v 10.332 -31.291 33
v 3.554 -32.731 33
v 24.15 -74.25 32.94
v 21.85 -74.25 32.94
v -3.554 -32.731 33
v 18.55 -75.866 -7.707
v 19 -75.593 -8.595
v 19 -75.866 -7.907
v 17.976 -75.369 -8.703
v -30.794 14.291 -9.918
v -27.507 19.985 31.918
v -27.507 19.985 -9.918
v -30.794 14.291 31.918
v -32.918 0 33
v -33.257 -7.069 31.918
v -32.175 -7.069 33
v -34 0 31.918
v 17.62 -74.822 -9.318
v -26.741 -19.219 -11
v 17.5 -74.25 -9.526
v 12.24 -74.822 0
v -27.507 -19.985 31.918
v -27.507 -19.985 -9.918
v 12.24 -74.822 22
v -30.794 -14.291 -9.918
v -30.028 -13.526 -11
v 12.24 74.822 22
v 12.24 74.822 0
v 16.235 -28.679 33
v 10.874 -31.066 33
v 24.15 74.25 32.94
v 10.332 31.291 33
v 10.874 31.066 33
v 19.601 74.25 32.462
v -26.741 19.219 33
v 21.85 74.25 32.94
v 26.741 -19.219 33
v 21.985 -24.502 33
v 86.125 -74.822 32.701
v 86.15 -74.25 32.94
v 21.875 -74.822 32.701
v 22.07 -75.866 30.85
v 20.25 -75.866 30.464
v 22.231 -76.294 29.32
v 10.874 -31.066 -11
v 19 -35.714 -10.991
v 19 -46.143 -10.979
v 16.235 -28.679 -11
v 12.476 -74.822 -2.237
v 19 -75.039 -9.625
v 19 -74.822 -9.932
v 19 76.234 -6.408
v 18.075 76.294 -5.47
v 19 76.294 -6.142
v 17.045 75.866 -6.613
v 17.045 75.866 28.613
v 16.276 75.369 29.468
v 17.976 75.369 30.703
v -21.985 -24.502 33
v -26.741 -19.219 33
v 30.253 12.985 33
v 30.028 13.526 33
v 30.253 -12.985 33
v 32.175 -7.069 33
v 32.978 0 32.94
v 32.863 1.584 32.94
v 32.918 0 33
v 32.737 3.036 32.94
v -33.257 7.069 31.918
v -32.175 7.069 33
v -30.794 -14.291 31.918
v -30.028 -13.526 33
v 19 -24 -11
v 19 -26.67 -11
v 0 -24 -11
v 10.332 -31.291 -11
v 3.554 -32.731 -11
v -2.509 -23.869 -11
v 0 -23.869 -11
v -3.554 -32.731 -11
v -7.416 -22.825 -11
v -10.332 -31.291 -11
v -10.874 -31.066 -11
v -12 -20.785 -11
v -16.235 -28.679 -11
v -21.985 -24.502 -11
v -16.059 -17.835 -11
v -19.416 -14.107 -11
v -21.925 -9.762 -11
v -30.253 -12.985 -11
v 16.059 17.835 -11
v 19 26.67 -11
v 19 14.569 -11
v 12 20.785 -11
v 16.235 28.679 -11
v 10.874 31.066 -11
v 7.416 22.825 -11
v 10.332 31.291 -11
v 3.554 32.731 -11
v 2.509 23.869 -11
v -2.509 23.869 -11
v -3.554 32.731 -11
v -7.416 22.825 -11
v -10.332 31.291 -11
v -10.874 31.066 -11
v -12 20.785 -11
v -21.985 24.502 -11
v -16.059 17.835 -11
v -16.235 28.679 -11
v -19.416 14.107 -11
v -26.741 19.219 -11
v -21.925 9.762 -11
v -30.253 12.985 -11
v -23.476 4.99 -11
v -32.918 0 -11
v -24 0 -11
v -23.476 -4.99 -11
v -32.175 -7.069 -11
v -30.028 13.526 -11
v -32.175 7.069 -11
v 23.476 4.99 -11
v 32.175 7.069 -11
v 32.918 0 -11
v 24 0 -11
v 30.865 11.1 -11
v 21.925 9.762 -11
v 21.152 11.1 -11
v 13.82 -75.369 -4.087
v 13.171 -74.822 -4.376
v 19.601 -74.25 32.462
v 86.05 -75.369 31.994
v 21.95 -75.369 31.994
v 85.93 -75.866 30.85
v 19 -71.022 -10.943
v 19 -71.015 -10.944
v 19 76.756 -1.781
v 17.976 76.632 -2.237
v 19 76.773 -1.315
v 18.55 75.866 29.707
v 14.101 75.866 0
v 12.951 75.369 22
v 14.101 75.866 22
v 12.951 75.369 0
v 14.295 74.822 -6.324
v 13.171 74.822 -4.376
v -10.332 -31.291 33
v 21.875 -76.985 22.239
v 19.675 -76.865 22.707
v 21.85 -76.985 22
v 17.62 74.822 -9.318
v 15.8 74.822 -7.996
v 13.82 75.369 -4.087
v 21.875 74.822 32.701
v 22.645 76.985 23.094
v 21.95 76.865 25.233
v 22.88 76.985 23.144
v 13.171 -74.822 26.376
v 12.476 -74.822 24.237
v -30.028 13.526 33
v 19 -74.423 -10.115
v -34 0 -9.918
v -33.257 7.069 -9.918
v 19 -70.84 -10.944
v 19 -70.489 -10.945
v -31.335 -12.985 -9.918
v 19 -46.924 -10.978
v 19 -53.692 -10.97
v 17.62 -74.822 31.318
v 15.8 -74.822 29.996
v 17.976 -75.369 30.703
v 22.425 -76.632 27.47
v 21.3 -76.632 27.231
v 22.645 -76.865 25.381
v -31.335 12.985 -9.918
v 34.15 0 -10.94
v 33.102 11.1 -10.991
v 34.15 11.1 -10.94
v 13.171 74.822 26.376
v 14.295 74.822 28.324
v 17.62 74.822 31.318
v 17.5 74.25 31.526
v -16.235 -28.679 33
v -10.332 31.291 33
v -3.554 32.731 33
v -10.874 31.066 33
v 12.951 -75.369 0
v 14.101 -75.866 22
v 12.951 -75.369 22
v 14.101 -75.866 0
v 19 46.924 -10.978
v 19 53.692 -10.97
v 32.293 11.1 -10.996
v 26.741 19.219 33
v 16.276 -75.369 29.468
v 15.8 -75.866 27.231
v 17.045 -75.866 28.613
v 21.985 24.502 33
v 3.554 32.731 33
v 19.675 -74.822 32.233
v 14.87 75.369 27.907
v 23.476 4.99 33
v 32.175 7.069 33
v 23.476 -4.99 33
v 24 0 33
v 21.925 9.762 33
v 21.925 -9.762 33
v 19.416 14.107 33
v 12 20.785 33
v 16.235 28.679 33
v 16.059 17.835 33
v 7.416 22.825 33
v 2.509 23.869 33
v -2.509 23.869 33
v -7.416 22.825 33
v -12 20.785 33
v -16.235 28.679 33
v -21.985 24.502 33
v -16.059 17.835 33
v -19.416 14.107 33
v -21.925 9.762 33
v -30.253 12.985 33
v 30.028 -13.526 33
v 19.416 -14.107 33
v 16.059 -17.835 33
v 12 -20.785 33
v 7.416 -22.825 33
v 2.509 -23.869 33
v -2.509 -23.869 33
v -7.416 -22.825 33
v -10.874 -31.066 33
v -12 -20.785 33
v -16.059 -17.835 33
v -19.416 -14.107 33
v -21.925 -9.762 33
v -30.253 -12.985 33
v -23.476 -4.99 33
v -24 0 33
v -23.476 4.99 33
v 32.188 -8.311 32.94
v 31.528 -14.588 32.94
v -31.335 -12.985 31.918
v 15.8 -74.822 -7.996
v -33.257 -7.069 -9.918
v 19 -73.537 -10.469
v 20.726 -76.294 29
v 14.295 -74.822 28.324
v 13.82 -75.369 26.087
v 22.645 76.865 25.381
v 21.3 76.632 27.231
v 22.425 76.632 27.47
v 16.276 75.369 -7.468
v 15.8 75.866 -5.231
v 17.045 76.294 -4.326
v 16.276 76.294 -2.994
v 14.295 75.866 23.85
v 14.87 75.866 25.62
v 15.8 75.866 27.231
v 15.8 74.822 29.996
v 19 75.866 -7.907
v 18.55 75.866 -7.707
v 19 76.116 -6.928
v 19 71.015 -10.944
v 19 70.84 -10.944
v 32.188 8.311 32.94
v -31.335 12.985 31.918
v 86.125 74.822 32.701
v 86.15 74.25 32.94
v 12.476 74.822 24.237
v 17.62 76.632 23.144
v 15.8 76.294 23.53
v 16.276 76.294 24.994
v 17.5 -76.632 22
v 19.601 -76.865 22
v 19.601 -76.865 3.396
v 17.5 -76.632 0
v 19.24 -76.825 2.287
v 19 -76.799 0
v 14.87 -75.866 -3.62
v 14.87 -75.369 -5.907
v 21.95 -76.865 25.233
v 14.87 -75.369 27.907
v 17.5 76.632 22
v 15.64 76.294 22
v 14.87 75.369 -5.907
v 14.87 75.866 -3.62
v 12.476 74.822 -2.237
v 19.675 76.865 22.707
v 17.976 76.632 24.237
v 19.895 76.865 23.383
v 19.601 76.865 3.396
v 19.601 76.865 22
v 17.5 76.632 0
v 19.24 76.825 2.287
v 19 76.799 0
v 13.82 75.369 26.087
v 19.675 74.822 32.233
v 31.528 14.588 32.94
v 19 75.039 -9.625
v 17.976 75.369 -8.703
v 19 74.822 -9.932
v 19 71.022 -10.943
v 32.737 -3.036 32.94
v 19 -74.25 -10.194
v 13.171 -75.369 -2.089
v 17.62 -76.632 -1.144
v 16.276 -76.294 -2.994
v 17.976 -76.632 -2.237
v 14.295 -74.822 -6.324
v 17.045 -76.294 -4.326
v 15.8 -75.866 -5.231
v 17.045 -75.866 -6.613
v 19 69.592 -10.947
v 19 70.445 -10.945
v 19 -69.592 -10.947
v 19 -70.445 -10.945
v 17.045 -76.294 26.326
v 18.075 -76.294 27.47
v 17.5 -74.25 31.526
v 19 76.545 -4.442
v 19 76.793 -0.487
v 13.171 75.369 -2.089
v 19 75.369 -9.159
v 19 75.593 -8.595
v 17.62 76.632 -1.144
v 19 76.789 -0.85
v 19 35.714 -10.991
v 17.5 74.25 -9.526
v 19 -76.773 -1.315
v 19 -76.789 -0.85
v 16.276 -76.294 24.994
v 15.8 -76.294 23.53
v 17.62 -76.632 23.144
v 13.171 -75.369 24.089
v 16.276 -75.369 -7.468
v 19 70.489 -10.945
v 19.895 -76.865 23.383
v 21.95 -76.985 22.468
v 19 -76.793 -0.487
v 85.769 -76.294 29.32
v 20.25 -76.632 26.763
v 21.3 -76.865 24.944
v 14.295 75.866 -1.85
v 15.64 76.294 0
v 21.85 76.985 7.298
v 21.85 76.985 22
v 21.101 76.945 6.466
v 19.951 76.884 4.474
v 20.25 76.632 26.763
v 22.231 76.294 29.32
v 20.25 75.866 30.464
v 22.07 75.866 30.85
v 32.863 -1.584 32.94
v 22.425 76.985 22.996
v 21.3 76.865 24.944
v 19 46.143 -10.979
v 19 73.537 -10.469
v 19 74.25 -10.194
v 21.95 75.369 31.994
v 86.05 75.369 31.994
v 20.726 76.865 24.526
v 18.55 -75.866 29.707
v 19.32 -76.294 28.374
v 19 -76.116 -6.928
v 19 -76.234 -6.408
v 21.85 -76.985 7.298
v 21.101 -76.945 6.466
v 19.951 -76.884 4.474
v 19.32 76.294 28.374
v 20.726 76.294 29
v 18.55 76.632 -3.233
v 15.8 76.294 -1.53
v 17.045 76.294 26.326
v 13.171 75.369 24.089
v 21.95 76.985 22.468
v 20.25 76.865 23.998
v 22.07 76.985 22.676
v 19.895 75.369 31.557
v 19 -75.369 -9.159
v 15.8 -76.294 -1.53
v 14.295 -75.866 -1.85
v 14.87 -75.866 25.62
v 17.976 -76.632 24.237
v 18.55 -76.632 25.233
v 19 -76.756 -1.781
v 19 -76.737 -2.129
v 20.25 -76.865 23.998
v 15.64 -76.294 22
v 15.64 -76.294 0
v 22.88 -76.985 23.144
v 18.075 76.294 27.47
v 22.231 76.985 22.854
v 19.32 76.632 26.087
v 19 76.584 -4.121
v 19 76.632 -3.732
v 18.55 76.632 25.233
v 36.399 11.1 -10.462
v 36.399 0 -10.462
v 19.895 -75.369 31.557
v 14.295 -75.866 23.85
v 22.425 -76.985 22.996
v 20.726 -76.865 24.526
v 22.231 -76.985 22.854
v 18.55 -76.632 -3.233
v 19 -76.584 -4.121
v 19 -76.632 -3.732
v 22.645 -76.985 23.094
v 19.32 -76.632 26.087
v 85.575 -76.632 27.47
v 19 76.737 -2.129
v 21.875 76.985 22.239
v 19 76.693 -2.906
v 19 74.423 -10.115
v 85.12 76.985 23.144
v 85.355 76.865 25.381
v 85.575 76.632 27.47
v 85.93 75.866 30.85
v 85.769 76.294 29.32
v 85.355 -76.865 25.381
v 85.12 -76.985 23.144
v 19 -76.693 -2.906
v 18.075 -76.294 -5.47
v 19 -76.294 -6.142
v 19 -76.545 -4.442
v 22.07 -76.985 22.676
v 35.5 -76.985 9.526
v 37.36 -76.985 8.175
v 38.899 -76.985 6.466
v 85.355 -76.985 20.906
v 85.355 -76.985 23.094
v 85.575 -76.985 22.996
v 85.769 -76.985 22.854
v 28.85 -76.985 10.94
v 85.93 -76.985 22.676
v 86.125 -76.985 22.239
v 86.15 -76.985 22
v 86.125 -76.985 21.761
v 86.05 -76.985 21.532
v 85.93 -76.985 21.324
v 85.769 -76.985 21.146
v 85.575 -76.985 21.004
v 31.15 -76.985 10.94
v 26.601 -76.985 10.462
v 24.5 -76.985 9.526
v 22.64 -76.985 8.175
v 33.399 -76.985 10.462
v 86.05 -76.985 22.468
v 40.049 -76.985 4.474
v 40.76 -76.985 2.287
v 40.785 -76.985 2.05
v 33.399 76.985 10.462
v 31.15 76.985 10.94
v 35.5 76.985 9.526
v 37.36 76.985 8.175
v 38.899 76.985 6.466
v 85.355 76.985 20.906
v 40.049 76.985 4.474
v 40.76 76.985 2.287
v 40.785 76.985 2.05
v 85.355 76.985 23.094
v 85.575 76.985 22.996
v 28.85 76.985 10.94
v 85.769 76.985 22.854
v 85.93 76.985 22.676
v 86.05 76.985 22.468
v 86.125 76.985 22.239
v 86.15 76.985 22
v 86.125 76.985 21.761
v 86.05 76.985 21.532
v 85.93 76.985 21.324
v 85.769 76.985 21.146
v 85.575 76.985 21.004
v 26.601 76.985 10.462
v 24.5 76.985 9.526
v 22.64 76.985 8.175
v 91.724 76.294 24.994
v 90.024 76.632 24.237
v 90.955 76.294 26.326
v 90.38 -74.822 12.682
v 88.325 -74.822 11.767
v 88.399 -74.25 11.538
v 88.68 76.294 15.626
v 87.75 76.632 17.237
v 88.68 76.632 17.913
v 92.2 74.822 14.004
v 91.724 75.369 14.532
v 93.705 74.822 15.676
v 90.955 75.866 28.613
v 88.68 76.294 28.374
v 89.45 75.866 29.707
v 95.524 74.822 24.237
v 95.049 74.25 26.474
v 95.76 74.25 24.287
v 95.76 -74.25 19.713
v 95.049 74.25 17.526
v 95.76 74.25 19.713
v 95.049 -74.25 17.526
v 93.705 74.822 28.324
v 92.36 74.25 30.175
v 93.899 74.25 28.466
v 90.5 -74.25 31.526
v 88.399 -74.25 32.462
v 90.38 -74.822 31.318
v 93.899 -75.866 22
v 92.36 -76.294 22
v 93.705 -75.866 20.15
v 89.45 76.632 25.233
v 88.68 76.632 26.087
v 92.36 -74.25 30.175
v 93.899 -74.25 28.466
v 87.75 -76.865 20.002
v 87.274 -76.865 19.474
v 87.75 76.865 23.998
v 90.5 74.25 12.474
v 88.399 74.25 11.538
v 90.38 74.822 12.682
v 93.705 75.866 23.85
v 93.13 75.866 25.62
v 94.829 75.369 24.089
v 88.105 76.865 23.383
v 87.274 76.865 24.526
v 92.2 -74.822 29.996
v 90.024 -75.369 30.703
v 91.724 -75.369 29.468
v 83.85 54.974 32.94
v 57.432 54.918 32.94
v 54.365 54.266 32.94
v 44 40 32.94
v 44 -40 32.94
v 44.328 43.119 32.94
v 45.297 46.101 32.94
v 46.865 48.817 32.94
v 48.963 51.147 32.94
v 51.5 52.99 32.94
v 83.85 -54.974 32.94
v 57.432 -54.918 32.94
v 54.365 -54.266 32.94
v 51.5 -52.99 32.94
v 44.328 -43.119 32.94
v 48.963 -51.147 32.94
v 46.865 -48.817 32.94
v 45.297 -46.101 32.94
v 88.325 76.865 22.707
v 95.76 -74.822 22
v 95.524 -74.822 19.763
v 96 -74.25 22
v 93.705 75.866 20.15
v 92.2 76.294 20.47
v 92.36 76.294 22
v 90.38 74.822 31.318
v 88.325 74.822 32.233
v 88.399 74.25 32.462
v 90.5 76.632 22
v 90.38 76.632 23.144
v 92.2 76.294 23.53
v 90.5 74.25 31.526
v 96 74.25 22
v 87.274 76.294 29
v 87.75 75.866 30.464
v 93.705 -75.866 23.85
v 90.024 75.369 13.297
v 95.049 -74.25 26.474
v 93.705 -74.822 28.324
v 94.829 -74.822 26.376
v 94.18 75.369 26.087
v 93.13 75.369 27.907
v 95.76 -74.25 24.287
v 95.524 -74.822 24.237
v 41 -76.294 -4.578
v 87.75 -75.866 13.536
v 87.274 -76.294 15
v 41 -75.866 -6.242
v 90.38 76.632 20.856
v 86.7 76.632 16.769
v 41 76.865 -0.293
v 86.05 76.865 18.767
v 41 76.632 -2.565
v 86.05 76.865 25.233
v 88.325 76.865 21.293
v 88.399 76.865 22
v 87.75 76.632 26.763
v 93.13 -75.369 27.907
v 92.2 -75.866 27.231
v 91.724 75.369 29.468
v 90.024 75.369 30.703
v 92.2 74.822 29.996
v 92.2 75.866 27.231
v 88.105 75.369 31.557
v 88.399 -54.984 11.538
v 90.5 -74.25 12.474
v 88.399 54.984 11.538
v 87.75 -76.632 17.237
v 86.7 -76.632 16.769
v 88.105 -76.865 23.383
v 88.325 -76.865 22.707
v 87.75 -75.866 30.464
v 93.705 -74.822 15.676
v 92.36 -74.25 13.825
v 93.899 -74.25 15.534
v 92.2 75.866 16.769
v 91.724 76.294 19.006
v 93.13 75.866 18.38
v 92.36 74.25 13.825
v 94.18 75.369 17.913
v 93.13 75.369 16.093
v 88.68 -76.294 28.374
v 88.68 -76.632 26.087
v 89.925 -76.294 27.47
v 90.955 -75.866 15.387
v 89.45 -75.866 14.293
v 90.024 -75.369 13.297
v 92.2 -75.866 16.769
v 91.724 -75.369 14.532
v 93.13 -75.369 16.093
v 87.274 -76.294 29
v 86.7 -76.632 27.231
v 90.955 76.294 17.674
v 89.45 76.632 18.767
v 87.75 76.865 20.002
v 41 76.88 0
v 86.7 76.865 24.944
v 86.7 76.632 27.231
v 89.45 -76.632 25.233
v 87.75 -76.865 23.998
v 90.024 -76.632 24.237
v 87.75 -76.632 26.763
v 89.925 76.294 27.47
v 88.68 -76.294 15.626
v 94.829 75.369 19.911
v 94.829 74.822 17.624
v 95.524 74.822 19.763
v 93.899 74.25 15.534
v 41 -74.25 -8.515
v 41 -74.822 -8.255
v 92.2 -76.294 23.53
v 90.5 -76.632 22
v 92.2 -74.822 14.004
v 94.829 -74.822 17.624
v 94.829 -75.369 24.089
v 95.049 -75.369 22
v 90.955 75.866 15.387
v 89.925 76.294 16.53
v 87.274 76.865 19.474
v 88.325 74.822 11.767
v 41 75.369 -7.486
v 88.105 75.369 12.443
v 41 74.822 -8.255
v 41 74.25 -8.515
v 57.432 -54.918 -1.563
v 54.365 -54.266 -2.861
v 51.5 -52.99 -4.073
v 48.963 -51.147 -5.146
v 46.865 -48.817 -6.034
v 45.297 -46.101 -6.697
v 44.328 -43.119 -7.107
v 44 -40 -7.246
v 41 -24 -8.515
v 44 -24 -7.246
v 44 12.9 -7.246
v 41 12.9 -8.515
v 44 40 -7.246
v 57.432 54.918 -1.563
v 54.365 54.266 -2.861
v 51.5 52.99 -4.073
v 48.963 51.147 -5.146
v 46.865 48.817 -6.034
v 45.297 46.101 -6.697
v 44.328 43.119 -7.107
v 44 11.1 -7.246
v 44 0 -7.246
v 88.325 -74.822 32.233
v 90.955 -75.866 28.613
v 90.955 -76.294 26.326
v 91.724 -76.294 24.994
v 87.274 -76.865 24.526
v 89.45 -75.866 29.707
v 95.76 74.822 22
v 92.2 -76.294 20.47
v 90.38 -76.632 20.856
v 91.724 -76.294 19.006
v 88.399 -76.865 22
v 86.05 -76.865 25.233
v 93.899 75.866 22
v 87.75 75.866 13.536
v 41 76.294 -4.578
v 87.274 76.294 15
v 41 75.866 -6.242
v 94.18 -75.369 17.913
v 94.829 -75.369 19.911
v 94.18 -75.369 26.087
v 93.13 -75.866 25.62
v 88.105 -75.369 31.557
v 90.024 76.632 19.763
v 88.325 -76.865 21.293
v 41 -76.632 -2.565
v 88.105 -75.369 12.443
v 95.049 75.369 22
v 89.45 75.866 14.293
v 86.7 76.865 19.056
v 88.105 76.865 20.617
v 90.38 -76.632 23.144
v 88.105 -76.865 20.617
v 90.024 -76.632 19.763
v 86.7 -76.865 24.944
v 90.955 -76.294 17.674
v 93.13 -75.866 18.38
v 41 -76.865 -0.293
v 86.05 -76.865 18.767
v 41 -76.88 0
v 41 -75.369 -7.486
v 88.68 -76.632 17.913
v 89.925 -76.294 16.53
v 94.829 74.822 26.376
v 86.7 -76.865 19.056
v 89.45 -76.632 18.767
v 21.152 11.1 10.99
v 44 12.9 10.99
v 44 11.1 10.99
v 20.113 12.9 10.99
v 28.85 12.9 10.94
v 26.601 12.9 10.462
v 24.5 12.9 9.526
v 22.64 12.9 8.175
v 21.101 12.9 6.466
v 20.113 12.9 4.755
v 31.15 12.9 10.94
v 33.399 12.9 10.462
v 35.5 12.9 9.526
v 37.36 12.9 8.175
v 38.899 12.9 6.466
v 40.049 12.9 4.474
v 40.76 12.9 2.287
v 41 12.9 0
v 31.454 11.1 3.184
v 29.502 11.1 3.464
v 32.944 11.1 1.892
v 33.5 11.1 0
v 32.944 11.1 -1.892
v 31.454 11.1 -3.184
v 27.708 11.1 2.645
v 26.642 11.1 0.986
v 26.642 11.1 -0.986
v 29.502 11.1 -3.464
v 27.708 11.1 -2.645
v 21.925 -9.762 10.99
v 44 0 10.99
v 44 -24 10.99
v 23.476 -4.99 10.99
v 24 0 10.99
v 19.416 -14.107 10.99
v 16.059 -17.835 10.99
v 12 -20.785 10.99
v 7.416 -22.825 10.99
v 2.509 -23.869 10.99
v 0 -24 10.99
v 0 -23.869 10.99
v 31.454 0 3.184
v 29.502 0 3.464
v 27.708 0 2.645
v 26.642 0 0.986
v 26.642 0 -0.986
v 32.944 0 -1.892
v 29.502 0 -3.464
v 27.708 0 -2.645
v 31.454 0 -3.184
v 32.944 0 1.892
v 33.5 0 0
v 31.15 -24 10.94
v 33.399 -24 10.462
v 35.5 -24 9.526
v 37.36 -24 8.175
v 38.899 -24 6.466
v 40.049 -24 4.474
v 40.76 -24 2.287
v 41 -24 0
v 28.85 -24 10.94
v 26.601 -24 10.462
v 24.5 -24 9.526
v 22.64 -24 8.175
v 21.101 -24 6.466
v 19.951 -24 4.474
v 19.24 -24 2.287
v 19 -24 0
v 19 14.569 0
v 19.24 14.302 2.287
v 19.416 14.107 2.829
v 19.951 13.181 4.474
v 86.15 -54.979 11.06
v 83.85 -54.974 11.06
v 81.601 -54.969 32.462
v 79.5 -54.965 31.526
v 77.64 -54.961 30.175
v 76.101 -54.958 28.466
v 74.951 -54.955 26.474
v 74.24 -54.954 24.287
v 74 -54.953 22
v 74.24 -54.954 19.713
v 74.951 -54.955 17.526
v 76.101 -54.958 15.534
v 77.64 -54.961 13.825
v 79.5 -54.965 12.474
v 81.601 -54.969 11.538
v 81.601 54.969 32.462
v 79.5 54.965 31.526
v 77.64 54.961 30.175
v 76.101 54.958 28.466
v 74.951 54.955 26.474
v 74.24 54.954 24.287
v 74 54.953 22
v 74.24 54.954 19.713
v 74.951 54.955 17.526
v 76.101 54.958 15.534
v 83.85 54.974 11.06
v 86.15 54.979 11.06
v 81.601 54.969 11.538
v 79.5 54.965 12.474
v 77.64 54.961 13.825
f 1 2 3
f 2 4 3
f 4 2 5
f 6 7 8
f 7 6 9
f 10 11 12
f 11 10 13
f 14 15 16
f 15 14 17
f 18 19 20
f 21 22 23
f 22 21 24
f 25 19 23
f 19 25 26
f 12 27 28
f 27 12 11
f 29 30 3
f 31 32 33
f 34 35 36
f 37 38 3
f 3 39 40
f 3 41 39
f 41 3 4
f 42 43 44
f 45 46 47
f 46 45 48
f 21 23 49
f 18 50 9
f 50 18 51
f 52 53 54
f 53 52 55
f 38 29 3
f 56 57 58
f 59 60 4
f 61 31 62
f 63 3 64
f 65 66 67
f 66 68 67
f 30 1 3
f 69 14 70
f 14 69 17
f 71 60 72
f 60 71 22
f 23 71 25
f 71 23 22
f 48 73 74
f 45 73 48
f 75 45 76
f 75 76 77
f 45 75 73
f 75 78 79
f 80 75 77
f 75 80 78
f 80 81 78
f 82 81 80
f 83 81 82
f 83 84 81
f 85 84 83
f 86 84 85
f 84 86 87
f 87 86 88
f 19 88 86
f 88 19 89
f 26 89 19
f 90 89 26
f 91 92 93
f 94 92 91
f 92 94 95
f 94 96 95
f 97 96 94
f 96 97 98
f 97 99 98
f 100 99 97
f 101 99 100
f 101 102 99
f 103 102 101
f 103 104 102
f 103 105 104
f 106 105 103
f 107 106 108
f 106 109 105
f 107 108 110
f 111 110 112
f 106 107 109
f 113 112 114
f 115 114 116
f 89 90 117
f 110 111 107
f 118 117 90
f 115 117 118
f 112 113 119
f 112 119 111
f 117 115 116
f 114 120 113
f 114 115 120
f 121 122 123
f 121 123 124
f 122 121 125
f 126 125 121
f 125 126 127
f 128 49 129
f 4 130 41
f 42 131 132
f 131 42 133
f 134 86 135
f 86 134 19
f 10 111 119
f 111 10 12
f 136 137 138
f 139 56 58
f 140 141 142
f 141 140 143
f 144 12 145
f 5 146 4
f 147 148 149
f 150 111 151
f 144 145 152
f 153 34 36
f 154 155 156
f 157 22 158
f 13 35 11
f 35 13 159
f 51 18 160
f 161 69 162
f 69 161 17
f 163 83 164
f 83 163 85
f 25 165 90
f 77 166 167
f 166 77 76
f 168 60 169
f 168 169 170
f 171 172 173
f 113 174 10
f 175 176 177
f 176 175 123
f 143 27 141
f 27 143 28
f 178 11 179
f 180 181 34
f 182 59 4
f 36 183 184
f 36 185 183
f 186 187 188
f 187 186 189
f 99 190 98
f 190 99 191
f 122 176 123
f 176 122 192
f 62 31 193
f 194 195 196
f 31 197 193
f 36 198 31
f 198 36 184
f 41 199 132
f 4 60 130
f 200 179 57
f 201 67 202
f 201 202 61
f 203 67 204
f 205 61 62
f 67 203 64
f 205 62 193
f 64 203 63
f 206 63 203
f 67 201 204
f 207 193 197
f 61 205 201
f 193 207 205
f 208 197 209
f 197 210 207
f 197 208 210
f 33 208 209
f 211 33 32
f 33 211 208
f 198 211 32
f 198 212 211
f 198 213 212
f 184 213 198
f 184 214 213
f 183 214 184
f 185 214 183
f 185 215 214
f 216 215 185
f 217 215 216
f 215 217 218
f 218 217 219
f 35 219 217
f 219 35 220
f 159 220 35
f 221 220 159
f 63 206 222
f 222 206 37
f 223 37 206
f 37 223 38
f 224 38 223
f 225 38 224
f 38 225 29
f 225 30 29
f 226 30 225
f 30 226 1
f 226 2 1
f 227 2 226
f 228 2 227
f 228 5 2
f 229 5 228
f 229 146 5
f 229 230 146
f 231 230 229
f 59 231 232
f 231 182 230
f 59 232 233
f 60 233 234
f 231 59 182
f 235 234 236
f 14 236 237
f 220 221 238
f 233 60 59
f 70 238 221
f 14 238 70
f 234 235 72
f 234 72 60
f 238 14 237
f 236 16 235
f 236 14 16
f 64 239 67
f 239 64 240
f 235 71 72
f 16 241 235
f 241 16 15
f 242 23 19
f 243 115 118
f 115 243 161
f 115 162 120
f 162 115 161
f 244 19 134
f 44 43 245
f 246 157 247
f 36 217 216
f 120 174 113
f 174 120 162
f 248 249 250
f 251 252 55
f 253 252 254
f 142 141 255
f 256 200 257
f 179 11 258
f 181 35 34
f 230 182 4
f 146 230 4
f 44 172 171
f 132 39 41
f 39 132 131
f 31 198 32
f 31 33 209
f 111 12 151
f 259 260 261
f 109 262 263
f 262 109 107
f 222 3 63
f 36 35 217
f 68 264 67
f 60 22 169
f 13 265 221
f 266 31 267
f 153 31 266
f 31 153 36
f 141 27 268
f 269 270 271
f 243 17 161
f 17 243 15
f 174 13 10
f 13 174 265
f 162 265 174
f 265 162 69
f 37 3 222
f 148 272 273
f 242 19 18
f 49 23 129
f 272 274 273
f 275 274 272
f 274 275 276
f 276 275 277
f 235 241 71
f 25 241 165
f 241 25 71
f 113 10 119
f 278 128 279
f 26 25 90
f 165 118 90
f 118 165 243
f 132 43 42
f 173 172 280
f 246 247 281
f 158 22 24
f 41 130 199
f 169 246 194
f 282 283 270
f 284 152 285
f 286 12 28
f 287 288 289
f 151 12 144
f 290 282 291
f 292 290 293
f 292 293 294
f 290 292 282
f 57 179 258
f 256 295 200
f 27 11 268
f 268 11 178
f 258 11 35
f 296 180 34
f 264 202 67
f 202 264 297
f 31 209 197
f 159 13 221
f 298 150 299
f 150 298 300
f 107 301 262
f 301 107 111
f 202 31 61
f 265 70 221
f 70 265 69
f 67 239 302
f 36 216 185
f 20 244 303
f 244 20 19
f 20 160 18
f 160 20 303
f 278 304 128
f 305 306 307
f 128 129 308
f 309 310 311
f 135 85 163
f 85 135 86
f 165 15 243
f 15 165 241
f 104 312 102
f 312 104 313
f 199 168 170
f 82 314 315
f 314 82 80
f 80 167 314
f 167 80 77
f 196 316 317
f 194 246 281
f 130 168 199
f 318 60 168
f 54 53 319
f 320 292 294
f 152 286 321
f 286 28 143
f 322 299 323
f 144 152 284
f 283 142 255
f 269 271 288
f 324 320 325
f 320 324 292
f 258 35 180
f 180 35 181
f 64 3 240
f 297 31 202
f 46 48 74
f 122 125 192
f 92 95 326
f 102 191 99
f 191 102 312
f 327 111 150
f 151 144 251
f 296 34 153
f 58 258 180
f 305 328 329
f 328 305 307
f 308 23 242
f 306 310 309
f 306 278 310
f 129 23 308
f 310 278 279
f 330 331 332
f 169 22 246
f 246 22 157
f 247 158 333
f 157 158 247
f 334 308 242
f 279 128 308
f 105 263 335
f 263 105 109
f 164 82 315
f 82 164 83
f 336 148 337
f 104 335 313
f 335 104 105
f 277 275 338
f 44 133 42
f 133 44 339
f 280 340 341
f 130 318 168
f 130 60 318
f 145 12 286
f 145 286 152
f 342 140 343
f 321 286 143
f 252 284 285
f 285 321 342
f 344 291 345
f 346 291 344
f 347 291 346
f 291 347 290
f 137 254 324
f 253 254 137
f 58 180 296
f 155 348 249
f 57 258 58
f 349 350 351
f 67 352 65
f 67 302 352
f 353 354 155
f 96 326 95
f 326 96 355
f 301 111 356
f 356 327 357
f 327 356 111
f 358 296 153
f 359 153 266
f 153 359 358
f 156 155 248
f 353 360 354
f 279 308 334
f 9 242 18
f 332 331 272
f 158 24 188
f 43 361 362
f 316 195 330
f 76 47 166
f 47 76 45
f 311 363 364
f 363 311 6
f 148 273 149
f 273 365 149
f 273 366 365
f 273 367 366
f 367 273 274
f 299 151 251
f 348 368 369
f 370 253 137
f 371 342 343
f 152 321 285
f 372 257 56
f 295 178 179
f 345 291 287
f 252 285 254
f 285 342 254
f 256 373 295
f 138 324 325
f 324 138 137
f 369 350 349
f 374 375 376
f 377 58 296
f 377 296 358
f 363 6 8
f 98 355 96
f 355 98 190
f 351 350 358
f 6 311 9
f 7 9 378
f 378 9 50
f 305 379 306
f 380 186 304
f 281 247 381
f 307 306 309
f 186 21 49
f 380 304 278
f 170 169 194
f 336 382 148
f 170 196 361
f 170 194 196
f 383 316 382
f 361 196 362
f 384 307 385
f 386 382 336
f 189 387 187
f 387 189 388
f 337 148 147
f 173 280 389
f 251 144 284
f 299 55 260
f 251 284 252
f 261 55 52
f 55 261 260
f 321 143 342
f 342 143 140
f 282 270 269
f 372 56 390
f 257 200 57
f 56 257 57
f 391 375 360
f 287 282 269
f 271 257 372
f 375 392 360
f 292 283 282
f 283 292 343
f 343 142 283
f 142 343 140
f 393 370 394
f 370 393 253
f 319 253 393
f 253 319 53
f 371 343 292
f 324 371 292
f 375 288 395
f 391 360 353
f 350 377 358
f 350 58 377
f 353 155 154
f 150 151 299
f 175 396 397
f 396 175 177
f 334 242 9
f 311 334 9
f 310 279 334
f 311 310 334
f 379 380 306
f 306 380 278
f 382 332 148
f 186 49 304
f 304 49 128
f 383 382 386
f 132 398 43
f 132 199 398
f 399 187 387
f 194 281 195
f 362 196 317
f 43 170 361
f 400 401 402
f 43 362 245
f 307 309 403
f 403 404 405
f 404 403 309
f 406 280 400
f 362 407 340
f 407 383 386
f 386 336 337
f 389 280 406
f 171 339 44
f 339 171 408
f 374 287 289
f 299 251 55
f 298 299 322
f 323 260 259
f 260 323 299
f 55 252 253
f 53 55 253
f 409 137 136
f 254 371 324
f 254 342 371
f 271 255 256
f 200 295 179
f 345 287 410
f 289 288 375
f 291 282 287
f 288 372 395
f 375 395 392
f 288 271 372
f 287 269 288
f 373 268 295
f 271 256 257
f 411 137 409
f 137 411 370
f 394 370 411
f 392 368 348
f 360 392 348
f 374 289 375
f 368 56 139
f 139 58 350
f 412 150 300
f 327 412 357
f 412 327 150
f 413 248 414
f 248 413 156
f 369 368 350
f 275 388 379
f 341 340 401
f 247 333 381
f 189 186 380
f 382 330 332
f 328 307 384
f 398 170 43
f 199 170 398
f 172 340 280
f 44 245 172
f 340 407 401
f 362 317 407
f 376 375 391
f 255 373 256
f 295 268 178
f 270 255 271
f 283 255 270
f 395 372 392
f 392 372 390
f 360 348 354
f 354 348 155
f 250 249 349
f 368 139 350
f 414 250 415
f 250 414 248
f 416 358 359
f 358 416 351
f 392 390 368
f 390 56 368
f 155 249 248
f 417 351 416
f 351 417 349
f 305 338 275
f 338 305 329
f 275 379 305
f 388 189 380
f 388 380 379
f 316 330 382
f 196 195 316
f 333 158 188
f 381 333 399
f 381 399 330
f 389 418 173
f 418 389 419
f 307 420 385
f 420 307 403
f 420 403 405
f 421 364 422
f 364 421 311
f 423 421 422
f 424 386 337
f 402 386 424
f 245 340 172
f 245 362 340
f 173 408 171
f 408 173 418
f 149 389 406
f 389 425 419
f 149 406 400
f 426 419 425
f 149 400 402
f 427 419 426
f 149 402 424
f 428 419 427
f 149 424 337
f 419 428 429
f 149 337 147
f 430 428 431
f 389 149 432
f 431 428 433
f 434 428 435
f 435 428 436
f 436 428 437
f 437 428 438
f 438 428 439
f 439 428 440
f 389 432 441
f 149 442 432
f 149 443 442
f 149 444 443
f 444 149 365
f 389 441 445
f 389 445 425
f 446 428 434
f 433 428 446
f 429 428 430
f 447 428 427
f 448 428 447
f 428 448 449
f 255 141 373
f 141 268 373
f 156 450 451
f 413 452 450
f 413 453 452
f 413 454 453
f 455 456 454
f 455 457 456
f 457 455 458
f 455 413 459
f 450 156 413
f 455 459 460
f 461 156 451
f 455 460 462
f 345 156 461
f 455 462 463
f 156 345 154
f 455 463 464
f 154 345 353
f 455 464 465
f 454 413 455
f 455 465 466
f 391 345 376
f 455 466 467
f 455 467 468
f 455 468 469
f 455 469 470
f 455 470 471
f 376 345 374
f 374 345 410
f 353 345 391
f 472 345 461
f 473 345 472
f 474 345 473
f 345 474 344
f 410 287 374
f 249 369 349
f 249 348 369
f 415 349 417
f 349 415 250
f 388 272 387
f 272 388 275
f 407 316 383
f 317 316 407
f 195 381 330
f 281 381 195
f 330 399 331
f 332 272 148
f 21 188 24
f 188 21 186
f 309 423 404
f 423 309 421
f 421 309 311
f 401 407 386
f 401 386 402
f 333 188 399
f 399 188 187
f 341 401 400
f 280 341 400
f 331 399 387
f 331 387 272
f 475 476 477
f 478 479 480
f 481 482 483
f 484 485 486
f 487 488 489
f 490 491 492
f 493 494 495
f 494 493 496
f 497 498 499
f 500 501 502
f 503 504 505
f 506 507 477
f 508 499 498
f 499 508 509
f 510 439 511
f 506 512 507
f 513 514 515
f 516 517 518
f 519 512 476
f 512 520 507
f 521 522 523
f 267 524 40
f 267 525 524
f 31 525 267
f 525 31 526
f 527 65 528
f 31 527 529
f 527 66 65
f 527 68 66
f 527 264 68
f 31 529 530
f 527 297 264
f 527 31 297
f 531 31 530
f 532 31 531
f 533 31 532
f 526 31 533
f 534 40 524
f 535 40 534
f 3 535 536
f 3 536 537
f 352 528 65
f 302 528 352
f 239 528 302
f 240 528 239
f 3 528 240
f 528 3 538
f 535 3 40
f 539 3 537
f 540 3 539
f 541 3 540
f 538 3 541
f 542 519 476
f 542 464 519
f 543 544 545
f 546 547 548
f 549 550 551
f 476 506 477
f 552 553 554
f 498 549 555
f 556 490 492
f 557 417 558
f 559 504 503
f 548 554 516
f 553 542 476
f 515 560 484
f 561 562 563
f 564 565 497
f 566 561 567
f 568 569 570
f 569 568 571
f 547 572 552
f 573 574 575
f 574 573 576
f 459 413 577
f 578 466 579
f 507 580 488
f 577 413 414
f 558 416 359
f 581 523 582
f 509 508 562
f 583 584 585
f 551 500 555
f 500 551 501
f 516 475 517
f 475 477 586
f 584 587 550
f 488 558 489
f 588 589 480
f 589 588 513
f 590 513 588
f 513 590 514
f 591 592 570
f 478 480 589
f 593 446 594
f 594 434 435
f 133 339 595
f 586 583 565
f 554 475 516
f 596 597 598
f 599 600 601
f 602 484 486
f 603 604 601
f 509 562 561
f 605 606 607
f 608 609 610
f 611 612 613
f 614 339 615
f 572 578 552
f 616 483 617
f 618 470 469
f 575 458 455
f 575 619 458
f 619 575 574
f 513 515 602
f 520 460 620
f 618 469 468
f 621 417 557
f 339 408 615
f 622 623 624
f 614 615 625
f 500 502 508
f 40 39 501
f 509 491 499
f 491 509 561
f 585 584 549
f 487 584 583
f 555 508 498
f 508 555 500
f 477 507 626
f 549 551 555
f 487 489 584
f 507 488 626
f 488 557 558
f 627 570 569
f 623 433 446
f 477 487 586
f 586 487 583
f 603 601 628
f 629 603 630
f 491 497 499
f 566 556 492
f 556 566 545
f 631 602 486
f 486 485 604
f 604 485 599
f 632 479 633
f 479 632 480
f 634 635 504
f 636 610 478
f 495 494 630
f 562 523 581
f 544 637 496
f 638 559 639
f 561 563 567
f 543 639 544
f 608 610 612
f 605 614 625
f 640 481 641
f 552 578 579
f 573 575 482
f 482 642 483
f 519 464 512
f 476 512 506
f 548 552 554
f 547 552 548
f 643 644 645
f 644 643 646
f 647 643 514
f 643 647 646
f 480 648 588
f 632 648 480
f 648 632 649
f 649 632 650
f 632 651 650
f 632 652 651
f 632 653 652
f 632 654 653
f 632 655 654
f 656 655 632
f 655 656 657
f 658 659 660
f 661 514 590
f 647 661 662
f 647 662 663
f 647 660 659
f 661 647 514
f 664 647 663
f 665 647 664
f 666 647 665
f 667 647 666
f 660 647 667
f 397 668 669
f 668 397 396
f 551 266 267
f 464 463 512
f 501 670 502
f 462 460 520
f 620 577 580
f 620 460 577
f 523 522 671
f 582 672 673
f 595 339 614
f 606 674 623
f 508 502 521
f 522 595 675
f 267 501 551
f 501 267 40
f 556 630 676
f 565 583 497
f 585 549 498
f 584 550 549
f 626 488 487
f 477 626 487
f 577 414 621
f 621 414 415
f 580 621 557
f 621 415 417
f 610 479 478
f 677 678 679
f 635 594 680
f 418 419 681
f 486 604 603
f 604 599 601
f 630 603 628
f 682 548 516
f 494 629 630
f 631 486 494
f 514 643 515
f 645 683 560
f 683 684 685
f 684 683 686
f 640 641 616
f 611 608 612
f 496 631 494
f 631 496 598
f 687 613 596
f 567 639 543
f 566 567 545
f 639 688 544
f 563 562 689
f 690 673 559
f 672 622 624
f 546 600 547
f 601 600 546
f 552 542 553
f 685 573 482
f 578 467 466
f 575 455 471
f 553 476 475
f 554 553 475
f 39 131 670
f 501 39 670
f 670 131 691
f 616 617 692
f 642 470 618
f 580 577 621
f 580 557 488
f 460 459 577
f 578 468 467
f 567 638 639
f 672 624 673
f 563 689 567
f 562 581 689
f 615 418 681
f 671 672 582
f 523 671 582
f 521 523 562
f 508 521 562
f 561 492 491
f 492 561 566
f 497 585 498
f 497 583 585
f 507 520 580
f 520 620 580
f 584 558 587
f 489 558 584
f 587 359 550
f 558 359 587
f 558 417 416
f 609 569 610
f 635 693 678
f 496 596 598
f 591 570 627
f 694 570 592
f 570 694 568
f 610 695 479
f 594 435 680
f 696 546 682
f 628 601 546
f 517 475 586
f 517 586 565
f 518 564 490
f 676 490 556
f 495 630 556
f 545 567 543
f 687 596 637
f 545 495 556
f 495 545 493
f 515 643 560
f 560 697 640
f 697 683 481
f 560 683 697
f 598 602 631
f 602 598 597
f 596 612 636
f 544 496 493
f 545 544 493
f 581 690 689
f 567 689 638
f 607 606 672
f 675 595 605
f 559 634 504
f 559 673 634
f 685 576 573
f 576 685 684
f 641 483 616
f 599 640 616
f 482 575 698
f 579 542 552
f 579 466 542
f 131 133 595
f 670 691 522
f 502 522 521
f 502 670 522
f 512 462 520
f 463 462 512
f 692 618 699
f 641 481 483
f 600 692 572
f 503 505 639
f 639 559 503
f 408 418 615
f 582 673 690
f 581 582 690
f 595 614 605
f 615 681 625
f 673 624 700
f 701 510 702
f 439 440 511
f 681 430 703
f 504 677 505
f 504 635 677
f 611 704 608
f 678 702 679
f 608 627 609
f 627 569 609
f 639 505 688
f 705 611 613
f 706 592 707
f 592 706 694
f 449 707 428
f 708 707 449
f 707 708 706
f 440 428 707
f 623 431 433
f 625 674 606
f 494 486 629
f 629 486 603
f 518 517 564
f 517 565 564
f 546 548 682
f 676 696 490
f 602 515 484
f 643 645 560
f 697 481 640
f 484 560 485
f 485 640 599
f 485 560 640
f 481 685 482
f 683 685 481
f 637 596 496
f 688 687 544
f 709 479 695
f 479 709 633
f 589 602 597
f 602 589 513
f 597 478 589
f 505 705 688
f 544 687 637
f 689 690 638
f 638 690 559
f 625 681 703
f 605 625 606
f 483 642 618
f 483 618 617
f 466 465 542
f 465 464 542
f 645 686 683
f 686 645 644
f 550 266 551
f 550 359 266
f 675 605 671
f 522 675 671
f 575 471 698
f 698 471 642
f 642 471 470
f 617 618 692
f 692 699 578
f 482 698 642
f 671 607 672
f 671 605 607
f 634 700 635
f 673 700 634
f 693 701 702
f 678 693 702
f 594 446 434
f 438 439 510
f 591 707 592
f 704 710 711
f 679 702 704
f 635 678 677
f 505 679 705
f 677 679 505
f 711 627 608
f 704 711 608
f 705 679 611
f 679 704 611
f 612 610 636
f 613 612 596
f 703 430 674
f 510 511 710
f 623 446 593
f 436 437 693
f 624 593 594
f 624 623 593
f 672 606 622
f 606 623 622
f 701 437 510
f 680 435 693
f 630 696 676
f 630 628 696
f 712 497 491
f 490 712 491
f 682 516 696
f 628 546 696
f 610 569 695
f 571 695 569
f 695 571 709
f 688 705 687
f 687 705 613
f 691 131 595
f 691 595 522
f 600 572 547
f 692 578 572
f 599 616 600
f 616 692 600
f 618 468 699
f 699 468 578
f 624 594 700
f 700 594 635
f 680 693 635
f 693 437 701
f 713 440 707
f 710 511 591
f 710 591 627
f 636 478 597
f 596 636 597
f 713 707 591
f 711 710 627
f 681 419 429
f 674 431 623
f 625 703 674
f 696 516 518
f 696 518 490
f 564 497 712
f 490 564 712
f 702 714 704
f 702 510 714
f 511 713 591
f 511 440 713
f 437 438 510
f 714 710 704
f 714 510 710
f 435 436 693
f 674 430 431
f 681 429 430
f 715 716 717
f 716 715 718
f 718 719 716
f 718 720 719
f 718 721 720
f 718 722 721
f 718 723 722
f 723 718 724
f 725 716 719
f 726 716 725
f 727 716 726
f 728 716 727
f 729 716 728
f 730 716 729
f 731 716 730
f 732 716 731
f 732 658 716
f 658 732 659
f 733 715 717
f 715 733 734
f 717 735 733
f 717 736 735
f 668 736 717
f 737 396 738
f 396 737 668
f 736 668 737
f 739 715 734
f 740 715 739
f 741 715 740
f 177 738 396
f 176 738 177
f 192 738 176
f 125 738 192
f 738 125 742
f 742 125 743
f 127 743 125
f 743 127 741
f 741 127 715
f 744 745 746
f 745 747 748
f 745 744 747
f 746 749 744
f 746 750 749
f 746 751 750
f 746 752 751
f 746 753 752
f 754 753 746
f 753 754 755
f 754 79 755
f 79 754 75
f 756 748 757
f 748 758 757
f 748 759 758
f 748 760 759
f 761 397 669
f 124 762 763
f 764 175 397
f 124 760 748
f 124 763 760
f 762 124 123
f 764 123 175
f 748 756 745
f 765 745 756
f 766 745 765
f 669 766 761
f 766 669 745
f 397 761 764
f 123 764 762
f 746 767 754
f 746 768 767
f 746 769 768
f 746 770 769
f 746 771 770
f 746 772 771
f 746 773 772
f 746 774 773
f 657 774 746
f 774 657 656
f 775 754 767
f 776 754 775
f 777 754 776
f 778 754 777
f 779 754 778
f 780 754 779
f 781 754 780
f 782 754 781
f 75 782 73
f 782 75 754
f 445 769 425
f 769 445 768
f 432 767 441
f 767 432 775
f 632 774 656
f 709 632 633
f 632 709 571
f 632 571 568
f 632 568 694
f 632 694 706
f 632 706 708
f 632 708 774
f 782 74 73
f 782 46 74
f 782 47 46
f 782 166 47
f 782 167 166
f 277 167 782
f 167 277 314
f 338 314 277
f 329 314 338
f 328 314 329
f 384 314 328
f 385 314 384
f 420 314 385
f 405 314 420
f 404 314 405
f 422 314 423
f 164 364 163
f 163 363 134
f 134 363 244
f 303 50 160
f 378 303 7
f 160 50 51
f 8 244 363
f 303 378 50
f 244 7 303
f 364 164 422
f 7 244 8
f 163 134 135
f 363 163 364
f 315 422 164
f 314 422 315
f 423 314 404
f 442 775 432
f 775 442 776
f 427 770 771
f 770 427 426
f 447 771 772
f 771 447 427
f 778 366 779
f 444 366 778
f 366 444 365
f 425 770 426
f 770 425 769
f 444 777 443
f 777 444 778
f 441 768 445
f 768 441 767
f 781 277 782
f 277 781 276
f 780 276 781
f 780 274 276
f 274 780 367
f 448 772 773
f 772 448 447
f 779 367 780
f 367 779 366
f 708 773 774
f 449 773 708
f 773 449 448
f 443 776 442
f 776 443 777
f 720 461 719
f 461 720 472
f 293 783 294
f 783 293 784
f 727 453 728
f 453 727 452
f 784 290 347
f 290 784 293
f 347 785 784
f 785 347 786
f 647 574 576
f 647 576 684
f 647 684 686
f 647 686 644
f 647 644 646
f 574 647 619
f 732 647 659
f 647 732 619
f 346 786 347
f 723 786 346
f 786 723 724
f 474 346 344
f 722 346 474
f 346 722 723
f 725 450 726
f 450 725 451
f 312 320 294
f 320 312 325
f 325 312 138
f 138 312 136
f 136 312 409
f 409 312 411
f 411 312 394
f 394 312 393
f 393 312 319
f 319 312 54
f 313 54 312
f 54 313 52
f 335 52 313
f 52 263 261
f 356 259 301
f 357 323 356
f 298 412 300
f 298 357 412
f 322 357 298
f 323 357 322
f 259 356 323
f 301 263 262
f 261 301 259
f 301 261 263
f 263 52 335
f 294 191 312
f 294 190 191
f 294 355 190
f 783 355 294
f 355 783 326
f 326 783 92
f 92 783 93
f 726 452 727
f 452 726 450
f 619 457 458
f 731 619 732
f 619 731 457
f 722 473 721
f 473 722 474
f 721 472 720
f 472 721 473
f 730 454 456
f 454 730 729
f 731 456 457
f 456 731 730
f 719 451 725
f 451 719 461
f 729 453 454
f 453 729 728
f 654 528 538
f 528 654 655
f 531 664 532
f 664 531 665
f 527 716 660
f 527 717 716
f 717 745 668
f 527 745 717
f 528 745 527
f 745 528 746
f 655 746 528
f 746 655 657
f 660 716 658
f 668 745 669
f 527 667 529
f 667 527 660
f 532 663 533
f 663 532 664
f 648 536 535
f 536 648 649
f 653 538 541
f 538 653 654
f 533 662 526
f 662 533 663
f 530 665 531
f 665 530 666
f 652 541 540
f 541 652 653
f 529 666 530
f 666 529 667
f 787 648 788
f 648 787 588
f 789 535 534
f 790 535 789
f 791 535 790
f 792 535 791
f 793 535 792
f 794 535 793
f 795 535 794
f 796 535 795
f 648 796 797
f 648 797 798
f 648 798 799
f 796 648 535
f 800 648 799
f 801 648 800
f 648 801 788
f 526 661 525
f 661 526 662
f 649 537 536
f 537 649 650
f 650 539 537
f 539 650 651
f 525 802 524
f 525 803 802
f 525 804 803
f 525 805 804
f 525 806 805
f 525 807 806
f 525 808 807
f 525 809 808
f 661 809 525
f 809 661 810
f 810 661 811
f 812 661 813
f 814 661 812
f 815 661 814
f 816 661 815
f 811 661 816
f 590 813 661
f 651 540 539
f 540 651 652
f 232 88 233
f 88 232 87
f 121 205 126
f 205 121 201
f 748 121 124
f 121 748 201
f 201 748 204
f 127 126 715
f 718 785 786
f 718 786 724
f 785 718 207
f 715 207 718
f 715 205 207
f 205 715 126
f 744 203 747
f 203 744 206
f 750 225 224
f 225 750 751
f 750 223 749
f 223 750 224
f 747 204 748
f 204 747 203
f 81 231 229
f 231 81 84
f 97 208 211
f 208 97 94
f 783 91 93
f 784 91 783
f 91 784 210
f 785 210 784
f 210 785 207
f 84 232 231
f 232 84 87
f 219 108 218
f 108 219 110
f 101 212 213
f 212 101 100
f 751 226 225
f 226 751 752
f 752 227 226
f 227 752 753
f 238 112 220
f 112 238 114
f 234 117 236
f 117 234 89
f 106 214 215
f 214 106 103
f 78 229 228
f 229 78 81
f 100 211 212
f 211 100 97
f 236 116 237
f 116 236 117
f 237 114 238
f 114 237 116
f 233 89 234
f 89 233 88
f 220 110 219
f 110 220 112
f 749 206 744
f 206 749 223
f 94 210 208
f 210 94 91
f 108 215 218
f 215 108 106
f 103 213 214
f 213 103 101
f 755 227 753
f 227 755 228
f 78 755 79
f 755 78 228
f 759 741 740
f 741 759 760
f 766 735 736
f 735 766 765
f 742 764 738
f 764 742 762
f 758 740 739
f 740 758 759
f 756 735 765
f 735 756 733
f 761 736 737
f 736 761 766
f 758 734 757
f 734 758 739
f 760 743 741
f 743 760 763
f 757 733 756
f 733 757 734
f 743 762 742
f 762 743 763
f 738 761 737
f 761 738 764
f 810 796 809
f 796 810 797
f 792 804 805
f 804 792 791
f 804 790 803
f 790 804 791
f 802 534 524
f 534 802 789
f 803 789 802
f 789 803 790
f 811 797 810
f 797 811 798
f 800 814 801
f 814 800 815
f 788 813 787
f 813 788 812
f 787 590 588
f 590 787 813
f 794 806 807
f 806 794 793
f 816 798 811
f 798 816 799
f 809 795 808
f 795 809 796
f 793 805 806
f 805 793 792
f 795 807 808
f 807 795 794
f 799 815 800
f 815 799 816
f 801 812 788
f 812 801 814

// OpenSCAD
// file: ../chamferer.scad
INFINITY = 10000;
ATOM = .01;

module chamfer_tool(r, fn, tool,
                    ax, ay, az,
                    ax2, ay2, az2,
                    ax3, ay3, az3) {
    rotate([ax3, ay3, az3])
    rotate([ax2, ay2, az2])
    rotate([ax, ay, az]) {
        if (tool=="sphere") {
            sphere(r, $fn=fn);
        }
        else if (tool=="hemisphere-up") {
            intersection() {
                sphere(r, $fn=fn);
                cylinder(r=r*2, h=r*2);
            }
        }
        else if (tool=="hemisphere-down") {
            difference() {
                sphere(r, $fn=fn);
                cylinder(r=r*2, h=r*2);
            }
        }
        else if (tool=="cone") {
            cylinder(r, r, 0, $fn=fn);
            scale([1, 1, -1])
            cylinder(r, r, 0, $fn=fn);
        }
        else if (tool=="cone-up") {
            cylinder(r, r, 0, $fn=fn, center=true);
        }
        else if (tool=="cone-down") {
            scale([1, 1, -1])
            cylinder(r, r, 0, $fn=fn, center=true);
        }
        else if (tool=="octahedron") {
            resize([r*2, r*2, r*2]) {
                cylinder(r, r, 0, $fn=4);
                scale([1, 1, -1])
                cylinder(r, r, 0, $fn=4);
            }
        }
        else if (tool=="pyramid") {
            resize([r*2, r*2, r*2]) {
                cylinder(r, r, 0, center=true, $fn=4);
            }
        }
        else if (tool=="rpyramid") {
            resize([r*2, r*2, r*2]) {
                cylinder(r, 0, r, center=true, $fn=4);
            }
        }
        else if (tool=="cylinder-z" || tool=="cylinder") {
            cylinder(r=r, h=ATOM, $fn=fn, center=true);
        }
        else if (tool=="cylinder-x") {
            rotate([0, 90, 0])
            cylinder(r=r, h=ATOM, $fn=fn, center=true);
        }
        else if (tool=="cylinder-y") {
            rotate([90, 0, 0])
            cylinder(r=r, h=ATOM, $fn=fn, center=true);
        }
        else if (tool=="cube") {
            cube(r*2, center=true);
        }
        else if (tool=="plate-y") {
            cube([r*2, ATOM, r*2], center=true);
        }
        else if (tool=="plate-z") {
            cube([r*2, r*2, ATOM], center=true);
        }
        else {
            assert(false, str("Unknown tool: ", tool));
        }
    }
}

module shrinker(r, tool, fn,
                ax, ay, az,
                ax2, ay2, az2,
                ax3, ay3, az3) {
    if (!r) {
        children();
    }
    else {
        // re-invert+grow = fillet
        difference() {
            cube(INFINITY/2, center=true);

            // invert+grow = carve
            minkowski() {
                difference() {
                    cube(INFINITY, center=true);
                    children();
                }
                //cube(r, center=true);
                chamfer_tool(r, fn, tool,
                             ax, ay, az,
                             ax2, ay2, az2,
                             ax3, ay3, az3);
            }
        }
    }
}

module chamferer(r, tool="sphere", fn=8, shrink=true, grow=true,
                 ax=0, ay=0, az=0,
                 ax2=0, ay2=0, az2=0,
                 ax3=0, ay3=0, az3=0,
) {
    if (!r) {
        children();
    }
    else {
        minkowski() {
            if (shrink)
                shrinker(r, tool, fn,
                         ax, ay, az,
                         ax2, ay2, az2,
                         ax3, ay3, az3) children();
            else
                children();
            
            if (grow)
                chamfer_tool(r, fn, tool,
                             ax, ay, az,
                             ax2, ay2, az2,
                             ax3, ay3, az3);
        }
    }
}



cube(50);

translate([70, 0, 0])
chamferer(5, "hemisphere-up", $preview? 6*4 : 30)
//shrinker(5, "sphere", $preview? 6*4 : 30)
cube(50);

translate([70*2, 0, 0])
chamferer(5, "octahedron", grow=false)
cube(50);
// main file
use <../chamferer.scad>

/*
This version was never printed:
drill-handle.scad (a much simpler variant) was found to work well enough.
*/


RD = 48;
RW = 22;
RTH = 10;

HD =  25-3;
HW = 110;
HX0 = 10;
HX =  30;

SX = 6;
SD = 7;

ATOM = 0.01;

module rcylinder(d, h) {
    hull() for (k=[-1, 1])
        translate([0, 0, k*(h/2-d/8)])
        scale([1, 1, .25])
        sphere(d=d);
}


module outer_ring() {
    chamferer(2)
    translate([0, 0, -RW/2])
    cylinder(d=RD+RTH*2, h=RW*2, center=!true);
}

module inner_ring()
    cylinder(d=RD, h=RW*10, center=true);

module handle_head() {
    for (z=[0, RW])
    translate([RD/2 + RTH  -RW/2, 0, z]) {
        rotate([90, 0, 0])
        rcylinder(d=RW, h=HW + HD*2);
    }

    translate([RD/2 + RTH  -RW/2 + RTH, 0, 0]) {
        rotate([90, 0, 0])
        rcylinder(d=RW, h=HW + HD*2);
    }

}

module handle_bar()
translate([RD/2 + RTH + HD/2 + HX0 + HX, 0, RW]) {
    rotate([90, 0, 0])
    rcylinder(d=HD, h=HW + HD*2);
}

module handle() {
    difference() {
        union() {
            hull() {
                outer_ring();
                handle_head();
            }

            hull() {
                handle_head();
                handle_bar();
            }
        }
        
        hull() {
            for (k=[-1, 1])
                translate([RD/2 + RTH + HD/2 + HX0 + (HX-HD)/2, (HW/2 + HD -HX/2-HD)*k, 0])
                cylinder(d=HX, h=HD*10, center=true);

            translate([RD/2 + RTH + HD + HX0 + HX, 0, 0])
            cube([ATOM, HW, HD*2], center=true);
        }
        
        inner_ring();
        
        w = RD/2;
        th1 = 1.8;
        th2 = RD/2;

        // plates
        for (kt=[[1, th1], [-1, th2]]) {
            k = kt[0];
            th = kt[1];
            translate([RD/2 + SX, k*w/2, -ATOM])
            cube([RD + SX*2, th, RW], center=true);
        }


        for (k=[1, -1])
            scale([1, k, 1])
            translate([RD/2 + SX, -w/2, 0])
            hull() {
                rotate([90, 0, 0]) cylinder(d=RW, h=HW);
                translate([0, 0, -RW])
                rotate([90, 0, 0]) cylinder(d=RW, h=HW);
            }

        // screw axis
        translate([RD/2 + SX, 0, 0])
        rotate([90, 0, 0])
        cylinder(d=SD, h=HW*2, center=true);
    }

    handle_bar();
}

handle();
